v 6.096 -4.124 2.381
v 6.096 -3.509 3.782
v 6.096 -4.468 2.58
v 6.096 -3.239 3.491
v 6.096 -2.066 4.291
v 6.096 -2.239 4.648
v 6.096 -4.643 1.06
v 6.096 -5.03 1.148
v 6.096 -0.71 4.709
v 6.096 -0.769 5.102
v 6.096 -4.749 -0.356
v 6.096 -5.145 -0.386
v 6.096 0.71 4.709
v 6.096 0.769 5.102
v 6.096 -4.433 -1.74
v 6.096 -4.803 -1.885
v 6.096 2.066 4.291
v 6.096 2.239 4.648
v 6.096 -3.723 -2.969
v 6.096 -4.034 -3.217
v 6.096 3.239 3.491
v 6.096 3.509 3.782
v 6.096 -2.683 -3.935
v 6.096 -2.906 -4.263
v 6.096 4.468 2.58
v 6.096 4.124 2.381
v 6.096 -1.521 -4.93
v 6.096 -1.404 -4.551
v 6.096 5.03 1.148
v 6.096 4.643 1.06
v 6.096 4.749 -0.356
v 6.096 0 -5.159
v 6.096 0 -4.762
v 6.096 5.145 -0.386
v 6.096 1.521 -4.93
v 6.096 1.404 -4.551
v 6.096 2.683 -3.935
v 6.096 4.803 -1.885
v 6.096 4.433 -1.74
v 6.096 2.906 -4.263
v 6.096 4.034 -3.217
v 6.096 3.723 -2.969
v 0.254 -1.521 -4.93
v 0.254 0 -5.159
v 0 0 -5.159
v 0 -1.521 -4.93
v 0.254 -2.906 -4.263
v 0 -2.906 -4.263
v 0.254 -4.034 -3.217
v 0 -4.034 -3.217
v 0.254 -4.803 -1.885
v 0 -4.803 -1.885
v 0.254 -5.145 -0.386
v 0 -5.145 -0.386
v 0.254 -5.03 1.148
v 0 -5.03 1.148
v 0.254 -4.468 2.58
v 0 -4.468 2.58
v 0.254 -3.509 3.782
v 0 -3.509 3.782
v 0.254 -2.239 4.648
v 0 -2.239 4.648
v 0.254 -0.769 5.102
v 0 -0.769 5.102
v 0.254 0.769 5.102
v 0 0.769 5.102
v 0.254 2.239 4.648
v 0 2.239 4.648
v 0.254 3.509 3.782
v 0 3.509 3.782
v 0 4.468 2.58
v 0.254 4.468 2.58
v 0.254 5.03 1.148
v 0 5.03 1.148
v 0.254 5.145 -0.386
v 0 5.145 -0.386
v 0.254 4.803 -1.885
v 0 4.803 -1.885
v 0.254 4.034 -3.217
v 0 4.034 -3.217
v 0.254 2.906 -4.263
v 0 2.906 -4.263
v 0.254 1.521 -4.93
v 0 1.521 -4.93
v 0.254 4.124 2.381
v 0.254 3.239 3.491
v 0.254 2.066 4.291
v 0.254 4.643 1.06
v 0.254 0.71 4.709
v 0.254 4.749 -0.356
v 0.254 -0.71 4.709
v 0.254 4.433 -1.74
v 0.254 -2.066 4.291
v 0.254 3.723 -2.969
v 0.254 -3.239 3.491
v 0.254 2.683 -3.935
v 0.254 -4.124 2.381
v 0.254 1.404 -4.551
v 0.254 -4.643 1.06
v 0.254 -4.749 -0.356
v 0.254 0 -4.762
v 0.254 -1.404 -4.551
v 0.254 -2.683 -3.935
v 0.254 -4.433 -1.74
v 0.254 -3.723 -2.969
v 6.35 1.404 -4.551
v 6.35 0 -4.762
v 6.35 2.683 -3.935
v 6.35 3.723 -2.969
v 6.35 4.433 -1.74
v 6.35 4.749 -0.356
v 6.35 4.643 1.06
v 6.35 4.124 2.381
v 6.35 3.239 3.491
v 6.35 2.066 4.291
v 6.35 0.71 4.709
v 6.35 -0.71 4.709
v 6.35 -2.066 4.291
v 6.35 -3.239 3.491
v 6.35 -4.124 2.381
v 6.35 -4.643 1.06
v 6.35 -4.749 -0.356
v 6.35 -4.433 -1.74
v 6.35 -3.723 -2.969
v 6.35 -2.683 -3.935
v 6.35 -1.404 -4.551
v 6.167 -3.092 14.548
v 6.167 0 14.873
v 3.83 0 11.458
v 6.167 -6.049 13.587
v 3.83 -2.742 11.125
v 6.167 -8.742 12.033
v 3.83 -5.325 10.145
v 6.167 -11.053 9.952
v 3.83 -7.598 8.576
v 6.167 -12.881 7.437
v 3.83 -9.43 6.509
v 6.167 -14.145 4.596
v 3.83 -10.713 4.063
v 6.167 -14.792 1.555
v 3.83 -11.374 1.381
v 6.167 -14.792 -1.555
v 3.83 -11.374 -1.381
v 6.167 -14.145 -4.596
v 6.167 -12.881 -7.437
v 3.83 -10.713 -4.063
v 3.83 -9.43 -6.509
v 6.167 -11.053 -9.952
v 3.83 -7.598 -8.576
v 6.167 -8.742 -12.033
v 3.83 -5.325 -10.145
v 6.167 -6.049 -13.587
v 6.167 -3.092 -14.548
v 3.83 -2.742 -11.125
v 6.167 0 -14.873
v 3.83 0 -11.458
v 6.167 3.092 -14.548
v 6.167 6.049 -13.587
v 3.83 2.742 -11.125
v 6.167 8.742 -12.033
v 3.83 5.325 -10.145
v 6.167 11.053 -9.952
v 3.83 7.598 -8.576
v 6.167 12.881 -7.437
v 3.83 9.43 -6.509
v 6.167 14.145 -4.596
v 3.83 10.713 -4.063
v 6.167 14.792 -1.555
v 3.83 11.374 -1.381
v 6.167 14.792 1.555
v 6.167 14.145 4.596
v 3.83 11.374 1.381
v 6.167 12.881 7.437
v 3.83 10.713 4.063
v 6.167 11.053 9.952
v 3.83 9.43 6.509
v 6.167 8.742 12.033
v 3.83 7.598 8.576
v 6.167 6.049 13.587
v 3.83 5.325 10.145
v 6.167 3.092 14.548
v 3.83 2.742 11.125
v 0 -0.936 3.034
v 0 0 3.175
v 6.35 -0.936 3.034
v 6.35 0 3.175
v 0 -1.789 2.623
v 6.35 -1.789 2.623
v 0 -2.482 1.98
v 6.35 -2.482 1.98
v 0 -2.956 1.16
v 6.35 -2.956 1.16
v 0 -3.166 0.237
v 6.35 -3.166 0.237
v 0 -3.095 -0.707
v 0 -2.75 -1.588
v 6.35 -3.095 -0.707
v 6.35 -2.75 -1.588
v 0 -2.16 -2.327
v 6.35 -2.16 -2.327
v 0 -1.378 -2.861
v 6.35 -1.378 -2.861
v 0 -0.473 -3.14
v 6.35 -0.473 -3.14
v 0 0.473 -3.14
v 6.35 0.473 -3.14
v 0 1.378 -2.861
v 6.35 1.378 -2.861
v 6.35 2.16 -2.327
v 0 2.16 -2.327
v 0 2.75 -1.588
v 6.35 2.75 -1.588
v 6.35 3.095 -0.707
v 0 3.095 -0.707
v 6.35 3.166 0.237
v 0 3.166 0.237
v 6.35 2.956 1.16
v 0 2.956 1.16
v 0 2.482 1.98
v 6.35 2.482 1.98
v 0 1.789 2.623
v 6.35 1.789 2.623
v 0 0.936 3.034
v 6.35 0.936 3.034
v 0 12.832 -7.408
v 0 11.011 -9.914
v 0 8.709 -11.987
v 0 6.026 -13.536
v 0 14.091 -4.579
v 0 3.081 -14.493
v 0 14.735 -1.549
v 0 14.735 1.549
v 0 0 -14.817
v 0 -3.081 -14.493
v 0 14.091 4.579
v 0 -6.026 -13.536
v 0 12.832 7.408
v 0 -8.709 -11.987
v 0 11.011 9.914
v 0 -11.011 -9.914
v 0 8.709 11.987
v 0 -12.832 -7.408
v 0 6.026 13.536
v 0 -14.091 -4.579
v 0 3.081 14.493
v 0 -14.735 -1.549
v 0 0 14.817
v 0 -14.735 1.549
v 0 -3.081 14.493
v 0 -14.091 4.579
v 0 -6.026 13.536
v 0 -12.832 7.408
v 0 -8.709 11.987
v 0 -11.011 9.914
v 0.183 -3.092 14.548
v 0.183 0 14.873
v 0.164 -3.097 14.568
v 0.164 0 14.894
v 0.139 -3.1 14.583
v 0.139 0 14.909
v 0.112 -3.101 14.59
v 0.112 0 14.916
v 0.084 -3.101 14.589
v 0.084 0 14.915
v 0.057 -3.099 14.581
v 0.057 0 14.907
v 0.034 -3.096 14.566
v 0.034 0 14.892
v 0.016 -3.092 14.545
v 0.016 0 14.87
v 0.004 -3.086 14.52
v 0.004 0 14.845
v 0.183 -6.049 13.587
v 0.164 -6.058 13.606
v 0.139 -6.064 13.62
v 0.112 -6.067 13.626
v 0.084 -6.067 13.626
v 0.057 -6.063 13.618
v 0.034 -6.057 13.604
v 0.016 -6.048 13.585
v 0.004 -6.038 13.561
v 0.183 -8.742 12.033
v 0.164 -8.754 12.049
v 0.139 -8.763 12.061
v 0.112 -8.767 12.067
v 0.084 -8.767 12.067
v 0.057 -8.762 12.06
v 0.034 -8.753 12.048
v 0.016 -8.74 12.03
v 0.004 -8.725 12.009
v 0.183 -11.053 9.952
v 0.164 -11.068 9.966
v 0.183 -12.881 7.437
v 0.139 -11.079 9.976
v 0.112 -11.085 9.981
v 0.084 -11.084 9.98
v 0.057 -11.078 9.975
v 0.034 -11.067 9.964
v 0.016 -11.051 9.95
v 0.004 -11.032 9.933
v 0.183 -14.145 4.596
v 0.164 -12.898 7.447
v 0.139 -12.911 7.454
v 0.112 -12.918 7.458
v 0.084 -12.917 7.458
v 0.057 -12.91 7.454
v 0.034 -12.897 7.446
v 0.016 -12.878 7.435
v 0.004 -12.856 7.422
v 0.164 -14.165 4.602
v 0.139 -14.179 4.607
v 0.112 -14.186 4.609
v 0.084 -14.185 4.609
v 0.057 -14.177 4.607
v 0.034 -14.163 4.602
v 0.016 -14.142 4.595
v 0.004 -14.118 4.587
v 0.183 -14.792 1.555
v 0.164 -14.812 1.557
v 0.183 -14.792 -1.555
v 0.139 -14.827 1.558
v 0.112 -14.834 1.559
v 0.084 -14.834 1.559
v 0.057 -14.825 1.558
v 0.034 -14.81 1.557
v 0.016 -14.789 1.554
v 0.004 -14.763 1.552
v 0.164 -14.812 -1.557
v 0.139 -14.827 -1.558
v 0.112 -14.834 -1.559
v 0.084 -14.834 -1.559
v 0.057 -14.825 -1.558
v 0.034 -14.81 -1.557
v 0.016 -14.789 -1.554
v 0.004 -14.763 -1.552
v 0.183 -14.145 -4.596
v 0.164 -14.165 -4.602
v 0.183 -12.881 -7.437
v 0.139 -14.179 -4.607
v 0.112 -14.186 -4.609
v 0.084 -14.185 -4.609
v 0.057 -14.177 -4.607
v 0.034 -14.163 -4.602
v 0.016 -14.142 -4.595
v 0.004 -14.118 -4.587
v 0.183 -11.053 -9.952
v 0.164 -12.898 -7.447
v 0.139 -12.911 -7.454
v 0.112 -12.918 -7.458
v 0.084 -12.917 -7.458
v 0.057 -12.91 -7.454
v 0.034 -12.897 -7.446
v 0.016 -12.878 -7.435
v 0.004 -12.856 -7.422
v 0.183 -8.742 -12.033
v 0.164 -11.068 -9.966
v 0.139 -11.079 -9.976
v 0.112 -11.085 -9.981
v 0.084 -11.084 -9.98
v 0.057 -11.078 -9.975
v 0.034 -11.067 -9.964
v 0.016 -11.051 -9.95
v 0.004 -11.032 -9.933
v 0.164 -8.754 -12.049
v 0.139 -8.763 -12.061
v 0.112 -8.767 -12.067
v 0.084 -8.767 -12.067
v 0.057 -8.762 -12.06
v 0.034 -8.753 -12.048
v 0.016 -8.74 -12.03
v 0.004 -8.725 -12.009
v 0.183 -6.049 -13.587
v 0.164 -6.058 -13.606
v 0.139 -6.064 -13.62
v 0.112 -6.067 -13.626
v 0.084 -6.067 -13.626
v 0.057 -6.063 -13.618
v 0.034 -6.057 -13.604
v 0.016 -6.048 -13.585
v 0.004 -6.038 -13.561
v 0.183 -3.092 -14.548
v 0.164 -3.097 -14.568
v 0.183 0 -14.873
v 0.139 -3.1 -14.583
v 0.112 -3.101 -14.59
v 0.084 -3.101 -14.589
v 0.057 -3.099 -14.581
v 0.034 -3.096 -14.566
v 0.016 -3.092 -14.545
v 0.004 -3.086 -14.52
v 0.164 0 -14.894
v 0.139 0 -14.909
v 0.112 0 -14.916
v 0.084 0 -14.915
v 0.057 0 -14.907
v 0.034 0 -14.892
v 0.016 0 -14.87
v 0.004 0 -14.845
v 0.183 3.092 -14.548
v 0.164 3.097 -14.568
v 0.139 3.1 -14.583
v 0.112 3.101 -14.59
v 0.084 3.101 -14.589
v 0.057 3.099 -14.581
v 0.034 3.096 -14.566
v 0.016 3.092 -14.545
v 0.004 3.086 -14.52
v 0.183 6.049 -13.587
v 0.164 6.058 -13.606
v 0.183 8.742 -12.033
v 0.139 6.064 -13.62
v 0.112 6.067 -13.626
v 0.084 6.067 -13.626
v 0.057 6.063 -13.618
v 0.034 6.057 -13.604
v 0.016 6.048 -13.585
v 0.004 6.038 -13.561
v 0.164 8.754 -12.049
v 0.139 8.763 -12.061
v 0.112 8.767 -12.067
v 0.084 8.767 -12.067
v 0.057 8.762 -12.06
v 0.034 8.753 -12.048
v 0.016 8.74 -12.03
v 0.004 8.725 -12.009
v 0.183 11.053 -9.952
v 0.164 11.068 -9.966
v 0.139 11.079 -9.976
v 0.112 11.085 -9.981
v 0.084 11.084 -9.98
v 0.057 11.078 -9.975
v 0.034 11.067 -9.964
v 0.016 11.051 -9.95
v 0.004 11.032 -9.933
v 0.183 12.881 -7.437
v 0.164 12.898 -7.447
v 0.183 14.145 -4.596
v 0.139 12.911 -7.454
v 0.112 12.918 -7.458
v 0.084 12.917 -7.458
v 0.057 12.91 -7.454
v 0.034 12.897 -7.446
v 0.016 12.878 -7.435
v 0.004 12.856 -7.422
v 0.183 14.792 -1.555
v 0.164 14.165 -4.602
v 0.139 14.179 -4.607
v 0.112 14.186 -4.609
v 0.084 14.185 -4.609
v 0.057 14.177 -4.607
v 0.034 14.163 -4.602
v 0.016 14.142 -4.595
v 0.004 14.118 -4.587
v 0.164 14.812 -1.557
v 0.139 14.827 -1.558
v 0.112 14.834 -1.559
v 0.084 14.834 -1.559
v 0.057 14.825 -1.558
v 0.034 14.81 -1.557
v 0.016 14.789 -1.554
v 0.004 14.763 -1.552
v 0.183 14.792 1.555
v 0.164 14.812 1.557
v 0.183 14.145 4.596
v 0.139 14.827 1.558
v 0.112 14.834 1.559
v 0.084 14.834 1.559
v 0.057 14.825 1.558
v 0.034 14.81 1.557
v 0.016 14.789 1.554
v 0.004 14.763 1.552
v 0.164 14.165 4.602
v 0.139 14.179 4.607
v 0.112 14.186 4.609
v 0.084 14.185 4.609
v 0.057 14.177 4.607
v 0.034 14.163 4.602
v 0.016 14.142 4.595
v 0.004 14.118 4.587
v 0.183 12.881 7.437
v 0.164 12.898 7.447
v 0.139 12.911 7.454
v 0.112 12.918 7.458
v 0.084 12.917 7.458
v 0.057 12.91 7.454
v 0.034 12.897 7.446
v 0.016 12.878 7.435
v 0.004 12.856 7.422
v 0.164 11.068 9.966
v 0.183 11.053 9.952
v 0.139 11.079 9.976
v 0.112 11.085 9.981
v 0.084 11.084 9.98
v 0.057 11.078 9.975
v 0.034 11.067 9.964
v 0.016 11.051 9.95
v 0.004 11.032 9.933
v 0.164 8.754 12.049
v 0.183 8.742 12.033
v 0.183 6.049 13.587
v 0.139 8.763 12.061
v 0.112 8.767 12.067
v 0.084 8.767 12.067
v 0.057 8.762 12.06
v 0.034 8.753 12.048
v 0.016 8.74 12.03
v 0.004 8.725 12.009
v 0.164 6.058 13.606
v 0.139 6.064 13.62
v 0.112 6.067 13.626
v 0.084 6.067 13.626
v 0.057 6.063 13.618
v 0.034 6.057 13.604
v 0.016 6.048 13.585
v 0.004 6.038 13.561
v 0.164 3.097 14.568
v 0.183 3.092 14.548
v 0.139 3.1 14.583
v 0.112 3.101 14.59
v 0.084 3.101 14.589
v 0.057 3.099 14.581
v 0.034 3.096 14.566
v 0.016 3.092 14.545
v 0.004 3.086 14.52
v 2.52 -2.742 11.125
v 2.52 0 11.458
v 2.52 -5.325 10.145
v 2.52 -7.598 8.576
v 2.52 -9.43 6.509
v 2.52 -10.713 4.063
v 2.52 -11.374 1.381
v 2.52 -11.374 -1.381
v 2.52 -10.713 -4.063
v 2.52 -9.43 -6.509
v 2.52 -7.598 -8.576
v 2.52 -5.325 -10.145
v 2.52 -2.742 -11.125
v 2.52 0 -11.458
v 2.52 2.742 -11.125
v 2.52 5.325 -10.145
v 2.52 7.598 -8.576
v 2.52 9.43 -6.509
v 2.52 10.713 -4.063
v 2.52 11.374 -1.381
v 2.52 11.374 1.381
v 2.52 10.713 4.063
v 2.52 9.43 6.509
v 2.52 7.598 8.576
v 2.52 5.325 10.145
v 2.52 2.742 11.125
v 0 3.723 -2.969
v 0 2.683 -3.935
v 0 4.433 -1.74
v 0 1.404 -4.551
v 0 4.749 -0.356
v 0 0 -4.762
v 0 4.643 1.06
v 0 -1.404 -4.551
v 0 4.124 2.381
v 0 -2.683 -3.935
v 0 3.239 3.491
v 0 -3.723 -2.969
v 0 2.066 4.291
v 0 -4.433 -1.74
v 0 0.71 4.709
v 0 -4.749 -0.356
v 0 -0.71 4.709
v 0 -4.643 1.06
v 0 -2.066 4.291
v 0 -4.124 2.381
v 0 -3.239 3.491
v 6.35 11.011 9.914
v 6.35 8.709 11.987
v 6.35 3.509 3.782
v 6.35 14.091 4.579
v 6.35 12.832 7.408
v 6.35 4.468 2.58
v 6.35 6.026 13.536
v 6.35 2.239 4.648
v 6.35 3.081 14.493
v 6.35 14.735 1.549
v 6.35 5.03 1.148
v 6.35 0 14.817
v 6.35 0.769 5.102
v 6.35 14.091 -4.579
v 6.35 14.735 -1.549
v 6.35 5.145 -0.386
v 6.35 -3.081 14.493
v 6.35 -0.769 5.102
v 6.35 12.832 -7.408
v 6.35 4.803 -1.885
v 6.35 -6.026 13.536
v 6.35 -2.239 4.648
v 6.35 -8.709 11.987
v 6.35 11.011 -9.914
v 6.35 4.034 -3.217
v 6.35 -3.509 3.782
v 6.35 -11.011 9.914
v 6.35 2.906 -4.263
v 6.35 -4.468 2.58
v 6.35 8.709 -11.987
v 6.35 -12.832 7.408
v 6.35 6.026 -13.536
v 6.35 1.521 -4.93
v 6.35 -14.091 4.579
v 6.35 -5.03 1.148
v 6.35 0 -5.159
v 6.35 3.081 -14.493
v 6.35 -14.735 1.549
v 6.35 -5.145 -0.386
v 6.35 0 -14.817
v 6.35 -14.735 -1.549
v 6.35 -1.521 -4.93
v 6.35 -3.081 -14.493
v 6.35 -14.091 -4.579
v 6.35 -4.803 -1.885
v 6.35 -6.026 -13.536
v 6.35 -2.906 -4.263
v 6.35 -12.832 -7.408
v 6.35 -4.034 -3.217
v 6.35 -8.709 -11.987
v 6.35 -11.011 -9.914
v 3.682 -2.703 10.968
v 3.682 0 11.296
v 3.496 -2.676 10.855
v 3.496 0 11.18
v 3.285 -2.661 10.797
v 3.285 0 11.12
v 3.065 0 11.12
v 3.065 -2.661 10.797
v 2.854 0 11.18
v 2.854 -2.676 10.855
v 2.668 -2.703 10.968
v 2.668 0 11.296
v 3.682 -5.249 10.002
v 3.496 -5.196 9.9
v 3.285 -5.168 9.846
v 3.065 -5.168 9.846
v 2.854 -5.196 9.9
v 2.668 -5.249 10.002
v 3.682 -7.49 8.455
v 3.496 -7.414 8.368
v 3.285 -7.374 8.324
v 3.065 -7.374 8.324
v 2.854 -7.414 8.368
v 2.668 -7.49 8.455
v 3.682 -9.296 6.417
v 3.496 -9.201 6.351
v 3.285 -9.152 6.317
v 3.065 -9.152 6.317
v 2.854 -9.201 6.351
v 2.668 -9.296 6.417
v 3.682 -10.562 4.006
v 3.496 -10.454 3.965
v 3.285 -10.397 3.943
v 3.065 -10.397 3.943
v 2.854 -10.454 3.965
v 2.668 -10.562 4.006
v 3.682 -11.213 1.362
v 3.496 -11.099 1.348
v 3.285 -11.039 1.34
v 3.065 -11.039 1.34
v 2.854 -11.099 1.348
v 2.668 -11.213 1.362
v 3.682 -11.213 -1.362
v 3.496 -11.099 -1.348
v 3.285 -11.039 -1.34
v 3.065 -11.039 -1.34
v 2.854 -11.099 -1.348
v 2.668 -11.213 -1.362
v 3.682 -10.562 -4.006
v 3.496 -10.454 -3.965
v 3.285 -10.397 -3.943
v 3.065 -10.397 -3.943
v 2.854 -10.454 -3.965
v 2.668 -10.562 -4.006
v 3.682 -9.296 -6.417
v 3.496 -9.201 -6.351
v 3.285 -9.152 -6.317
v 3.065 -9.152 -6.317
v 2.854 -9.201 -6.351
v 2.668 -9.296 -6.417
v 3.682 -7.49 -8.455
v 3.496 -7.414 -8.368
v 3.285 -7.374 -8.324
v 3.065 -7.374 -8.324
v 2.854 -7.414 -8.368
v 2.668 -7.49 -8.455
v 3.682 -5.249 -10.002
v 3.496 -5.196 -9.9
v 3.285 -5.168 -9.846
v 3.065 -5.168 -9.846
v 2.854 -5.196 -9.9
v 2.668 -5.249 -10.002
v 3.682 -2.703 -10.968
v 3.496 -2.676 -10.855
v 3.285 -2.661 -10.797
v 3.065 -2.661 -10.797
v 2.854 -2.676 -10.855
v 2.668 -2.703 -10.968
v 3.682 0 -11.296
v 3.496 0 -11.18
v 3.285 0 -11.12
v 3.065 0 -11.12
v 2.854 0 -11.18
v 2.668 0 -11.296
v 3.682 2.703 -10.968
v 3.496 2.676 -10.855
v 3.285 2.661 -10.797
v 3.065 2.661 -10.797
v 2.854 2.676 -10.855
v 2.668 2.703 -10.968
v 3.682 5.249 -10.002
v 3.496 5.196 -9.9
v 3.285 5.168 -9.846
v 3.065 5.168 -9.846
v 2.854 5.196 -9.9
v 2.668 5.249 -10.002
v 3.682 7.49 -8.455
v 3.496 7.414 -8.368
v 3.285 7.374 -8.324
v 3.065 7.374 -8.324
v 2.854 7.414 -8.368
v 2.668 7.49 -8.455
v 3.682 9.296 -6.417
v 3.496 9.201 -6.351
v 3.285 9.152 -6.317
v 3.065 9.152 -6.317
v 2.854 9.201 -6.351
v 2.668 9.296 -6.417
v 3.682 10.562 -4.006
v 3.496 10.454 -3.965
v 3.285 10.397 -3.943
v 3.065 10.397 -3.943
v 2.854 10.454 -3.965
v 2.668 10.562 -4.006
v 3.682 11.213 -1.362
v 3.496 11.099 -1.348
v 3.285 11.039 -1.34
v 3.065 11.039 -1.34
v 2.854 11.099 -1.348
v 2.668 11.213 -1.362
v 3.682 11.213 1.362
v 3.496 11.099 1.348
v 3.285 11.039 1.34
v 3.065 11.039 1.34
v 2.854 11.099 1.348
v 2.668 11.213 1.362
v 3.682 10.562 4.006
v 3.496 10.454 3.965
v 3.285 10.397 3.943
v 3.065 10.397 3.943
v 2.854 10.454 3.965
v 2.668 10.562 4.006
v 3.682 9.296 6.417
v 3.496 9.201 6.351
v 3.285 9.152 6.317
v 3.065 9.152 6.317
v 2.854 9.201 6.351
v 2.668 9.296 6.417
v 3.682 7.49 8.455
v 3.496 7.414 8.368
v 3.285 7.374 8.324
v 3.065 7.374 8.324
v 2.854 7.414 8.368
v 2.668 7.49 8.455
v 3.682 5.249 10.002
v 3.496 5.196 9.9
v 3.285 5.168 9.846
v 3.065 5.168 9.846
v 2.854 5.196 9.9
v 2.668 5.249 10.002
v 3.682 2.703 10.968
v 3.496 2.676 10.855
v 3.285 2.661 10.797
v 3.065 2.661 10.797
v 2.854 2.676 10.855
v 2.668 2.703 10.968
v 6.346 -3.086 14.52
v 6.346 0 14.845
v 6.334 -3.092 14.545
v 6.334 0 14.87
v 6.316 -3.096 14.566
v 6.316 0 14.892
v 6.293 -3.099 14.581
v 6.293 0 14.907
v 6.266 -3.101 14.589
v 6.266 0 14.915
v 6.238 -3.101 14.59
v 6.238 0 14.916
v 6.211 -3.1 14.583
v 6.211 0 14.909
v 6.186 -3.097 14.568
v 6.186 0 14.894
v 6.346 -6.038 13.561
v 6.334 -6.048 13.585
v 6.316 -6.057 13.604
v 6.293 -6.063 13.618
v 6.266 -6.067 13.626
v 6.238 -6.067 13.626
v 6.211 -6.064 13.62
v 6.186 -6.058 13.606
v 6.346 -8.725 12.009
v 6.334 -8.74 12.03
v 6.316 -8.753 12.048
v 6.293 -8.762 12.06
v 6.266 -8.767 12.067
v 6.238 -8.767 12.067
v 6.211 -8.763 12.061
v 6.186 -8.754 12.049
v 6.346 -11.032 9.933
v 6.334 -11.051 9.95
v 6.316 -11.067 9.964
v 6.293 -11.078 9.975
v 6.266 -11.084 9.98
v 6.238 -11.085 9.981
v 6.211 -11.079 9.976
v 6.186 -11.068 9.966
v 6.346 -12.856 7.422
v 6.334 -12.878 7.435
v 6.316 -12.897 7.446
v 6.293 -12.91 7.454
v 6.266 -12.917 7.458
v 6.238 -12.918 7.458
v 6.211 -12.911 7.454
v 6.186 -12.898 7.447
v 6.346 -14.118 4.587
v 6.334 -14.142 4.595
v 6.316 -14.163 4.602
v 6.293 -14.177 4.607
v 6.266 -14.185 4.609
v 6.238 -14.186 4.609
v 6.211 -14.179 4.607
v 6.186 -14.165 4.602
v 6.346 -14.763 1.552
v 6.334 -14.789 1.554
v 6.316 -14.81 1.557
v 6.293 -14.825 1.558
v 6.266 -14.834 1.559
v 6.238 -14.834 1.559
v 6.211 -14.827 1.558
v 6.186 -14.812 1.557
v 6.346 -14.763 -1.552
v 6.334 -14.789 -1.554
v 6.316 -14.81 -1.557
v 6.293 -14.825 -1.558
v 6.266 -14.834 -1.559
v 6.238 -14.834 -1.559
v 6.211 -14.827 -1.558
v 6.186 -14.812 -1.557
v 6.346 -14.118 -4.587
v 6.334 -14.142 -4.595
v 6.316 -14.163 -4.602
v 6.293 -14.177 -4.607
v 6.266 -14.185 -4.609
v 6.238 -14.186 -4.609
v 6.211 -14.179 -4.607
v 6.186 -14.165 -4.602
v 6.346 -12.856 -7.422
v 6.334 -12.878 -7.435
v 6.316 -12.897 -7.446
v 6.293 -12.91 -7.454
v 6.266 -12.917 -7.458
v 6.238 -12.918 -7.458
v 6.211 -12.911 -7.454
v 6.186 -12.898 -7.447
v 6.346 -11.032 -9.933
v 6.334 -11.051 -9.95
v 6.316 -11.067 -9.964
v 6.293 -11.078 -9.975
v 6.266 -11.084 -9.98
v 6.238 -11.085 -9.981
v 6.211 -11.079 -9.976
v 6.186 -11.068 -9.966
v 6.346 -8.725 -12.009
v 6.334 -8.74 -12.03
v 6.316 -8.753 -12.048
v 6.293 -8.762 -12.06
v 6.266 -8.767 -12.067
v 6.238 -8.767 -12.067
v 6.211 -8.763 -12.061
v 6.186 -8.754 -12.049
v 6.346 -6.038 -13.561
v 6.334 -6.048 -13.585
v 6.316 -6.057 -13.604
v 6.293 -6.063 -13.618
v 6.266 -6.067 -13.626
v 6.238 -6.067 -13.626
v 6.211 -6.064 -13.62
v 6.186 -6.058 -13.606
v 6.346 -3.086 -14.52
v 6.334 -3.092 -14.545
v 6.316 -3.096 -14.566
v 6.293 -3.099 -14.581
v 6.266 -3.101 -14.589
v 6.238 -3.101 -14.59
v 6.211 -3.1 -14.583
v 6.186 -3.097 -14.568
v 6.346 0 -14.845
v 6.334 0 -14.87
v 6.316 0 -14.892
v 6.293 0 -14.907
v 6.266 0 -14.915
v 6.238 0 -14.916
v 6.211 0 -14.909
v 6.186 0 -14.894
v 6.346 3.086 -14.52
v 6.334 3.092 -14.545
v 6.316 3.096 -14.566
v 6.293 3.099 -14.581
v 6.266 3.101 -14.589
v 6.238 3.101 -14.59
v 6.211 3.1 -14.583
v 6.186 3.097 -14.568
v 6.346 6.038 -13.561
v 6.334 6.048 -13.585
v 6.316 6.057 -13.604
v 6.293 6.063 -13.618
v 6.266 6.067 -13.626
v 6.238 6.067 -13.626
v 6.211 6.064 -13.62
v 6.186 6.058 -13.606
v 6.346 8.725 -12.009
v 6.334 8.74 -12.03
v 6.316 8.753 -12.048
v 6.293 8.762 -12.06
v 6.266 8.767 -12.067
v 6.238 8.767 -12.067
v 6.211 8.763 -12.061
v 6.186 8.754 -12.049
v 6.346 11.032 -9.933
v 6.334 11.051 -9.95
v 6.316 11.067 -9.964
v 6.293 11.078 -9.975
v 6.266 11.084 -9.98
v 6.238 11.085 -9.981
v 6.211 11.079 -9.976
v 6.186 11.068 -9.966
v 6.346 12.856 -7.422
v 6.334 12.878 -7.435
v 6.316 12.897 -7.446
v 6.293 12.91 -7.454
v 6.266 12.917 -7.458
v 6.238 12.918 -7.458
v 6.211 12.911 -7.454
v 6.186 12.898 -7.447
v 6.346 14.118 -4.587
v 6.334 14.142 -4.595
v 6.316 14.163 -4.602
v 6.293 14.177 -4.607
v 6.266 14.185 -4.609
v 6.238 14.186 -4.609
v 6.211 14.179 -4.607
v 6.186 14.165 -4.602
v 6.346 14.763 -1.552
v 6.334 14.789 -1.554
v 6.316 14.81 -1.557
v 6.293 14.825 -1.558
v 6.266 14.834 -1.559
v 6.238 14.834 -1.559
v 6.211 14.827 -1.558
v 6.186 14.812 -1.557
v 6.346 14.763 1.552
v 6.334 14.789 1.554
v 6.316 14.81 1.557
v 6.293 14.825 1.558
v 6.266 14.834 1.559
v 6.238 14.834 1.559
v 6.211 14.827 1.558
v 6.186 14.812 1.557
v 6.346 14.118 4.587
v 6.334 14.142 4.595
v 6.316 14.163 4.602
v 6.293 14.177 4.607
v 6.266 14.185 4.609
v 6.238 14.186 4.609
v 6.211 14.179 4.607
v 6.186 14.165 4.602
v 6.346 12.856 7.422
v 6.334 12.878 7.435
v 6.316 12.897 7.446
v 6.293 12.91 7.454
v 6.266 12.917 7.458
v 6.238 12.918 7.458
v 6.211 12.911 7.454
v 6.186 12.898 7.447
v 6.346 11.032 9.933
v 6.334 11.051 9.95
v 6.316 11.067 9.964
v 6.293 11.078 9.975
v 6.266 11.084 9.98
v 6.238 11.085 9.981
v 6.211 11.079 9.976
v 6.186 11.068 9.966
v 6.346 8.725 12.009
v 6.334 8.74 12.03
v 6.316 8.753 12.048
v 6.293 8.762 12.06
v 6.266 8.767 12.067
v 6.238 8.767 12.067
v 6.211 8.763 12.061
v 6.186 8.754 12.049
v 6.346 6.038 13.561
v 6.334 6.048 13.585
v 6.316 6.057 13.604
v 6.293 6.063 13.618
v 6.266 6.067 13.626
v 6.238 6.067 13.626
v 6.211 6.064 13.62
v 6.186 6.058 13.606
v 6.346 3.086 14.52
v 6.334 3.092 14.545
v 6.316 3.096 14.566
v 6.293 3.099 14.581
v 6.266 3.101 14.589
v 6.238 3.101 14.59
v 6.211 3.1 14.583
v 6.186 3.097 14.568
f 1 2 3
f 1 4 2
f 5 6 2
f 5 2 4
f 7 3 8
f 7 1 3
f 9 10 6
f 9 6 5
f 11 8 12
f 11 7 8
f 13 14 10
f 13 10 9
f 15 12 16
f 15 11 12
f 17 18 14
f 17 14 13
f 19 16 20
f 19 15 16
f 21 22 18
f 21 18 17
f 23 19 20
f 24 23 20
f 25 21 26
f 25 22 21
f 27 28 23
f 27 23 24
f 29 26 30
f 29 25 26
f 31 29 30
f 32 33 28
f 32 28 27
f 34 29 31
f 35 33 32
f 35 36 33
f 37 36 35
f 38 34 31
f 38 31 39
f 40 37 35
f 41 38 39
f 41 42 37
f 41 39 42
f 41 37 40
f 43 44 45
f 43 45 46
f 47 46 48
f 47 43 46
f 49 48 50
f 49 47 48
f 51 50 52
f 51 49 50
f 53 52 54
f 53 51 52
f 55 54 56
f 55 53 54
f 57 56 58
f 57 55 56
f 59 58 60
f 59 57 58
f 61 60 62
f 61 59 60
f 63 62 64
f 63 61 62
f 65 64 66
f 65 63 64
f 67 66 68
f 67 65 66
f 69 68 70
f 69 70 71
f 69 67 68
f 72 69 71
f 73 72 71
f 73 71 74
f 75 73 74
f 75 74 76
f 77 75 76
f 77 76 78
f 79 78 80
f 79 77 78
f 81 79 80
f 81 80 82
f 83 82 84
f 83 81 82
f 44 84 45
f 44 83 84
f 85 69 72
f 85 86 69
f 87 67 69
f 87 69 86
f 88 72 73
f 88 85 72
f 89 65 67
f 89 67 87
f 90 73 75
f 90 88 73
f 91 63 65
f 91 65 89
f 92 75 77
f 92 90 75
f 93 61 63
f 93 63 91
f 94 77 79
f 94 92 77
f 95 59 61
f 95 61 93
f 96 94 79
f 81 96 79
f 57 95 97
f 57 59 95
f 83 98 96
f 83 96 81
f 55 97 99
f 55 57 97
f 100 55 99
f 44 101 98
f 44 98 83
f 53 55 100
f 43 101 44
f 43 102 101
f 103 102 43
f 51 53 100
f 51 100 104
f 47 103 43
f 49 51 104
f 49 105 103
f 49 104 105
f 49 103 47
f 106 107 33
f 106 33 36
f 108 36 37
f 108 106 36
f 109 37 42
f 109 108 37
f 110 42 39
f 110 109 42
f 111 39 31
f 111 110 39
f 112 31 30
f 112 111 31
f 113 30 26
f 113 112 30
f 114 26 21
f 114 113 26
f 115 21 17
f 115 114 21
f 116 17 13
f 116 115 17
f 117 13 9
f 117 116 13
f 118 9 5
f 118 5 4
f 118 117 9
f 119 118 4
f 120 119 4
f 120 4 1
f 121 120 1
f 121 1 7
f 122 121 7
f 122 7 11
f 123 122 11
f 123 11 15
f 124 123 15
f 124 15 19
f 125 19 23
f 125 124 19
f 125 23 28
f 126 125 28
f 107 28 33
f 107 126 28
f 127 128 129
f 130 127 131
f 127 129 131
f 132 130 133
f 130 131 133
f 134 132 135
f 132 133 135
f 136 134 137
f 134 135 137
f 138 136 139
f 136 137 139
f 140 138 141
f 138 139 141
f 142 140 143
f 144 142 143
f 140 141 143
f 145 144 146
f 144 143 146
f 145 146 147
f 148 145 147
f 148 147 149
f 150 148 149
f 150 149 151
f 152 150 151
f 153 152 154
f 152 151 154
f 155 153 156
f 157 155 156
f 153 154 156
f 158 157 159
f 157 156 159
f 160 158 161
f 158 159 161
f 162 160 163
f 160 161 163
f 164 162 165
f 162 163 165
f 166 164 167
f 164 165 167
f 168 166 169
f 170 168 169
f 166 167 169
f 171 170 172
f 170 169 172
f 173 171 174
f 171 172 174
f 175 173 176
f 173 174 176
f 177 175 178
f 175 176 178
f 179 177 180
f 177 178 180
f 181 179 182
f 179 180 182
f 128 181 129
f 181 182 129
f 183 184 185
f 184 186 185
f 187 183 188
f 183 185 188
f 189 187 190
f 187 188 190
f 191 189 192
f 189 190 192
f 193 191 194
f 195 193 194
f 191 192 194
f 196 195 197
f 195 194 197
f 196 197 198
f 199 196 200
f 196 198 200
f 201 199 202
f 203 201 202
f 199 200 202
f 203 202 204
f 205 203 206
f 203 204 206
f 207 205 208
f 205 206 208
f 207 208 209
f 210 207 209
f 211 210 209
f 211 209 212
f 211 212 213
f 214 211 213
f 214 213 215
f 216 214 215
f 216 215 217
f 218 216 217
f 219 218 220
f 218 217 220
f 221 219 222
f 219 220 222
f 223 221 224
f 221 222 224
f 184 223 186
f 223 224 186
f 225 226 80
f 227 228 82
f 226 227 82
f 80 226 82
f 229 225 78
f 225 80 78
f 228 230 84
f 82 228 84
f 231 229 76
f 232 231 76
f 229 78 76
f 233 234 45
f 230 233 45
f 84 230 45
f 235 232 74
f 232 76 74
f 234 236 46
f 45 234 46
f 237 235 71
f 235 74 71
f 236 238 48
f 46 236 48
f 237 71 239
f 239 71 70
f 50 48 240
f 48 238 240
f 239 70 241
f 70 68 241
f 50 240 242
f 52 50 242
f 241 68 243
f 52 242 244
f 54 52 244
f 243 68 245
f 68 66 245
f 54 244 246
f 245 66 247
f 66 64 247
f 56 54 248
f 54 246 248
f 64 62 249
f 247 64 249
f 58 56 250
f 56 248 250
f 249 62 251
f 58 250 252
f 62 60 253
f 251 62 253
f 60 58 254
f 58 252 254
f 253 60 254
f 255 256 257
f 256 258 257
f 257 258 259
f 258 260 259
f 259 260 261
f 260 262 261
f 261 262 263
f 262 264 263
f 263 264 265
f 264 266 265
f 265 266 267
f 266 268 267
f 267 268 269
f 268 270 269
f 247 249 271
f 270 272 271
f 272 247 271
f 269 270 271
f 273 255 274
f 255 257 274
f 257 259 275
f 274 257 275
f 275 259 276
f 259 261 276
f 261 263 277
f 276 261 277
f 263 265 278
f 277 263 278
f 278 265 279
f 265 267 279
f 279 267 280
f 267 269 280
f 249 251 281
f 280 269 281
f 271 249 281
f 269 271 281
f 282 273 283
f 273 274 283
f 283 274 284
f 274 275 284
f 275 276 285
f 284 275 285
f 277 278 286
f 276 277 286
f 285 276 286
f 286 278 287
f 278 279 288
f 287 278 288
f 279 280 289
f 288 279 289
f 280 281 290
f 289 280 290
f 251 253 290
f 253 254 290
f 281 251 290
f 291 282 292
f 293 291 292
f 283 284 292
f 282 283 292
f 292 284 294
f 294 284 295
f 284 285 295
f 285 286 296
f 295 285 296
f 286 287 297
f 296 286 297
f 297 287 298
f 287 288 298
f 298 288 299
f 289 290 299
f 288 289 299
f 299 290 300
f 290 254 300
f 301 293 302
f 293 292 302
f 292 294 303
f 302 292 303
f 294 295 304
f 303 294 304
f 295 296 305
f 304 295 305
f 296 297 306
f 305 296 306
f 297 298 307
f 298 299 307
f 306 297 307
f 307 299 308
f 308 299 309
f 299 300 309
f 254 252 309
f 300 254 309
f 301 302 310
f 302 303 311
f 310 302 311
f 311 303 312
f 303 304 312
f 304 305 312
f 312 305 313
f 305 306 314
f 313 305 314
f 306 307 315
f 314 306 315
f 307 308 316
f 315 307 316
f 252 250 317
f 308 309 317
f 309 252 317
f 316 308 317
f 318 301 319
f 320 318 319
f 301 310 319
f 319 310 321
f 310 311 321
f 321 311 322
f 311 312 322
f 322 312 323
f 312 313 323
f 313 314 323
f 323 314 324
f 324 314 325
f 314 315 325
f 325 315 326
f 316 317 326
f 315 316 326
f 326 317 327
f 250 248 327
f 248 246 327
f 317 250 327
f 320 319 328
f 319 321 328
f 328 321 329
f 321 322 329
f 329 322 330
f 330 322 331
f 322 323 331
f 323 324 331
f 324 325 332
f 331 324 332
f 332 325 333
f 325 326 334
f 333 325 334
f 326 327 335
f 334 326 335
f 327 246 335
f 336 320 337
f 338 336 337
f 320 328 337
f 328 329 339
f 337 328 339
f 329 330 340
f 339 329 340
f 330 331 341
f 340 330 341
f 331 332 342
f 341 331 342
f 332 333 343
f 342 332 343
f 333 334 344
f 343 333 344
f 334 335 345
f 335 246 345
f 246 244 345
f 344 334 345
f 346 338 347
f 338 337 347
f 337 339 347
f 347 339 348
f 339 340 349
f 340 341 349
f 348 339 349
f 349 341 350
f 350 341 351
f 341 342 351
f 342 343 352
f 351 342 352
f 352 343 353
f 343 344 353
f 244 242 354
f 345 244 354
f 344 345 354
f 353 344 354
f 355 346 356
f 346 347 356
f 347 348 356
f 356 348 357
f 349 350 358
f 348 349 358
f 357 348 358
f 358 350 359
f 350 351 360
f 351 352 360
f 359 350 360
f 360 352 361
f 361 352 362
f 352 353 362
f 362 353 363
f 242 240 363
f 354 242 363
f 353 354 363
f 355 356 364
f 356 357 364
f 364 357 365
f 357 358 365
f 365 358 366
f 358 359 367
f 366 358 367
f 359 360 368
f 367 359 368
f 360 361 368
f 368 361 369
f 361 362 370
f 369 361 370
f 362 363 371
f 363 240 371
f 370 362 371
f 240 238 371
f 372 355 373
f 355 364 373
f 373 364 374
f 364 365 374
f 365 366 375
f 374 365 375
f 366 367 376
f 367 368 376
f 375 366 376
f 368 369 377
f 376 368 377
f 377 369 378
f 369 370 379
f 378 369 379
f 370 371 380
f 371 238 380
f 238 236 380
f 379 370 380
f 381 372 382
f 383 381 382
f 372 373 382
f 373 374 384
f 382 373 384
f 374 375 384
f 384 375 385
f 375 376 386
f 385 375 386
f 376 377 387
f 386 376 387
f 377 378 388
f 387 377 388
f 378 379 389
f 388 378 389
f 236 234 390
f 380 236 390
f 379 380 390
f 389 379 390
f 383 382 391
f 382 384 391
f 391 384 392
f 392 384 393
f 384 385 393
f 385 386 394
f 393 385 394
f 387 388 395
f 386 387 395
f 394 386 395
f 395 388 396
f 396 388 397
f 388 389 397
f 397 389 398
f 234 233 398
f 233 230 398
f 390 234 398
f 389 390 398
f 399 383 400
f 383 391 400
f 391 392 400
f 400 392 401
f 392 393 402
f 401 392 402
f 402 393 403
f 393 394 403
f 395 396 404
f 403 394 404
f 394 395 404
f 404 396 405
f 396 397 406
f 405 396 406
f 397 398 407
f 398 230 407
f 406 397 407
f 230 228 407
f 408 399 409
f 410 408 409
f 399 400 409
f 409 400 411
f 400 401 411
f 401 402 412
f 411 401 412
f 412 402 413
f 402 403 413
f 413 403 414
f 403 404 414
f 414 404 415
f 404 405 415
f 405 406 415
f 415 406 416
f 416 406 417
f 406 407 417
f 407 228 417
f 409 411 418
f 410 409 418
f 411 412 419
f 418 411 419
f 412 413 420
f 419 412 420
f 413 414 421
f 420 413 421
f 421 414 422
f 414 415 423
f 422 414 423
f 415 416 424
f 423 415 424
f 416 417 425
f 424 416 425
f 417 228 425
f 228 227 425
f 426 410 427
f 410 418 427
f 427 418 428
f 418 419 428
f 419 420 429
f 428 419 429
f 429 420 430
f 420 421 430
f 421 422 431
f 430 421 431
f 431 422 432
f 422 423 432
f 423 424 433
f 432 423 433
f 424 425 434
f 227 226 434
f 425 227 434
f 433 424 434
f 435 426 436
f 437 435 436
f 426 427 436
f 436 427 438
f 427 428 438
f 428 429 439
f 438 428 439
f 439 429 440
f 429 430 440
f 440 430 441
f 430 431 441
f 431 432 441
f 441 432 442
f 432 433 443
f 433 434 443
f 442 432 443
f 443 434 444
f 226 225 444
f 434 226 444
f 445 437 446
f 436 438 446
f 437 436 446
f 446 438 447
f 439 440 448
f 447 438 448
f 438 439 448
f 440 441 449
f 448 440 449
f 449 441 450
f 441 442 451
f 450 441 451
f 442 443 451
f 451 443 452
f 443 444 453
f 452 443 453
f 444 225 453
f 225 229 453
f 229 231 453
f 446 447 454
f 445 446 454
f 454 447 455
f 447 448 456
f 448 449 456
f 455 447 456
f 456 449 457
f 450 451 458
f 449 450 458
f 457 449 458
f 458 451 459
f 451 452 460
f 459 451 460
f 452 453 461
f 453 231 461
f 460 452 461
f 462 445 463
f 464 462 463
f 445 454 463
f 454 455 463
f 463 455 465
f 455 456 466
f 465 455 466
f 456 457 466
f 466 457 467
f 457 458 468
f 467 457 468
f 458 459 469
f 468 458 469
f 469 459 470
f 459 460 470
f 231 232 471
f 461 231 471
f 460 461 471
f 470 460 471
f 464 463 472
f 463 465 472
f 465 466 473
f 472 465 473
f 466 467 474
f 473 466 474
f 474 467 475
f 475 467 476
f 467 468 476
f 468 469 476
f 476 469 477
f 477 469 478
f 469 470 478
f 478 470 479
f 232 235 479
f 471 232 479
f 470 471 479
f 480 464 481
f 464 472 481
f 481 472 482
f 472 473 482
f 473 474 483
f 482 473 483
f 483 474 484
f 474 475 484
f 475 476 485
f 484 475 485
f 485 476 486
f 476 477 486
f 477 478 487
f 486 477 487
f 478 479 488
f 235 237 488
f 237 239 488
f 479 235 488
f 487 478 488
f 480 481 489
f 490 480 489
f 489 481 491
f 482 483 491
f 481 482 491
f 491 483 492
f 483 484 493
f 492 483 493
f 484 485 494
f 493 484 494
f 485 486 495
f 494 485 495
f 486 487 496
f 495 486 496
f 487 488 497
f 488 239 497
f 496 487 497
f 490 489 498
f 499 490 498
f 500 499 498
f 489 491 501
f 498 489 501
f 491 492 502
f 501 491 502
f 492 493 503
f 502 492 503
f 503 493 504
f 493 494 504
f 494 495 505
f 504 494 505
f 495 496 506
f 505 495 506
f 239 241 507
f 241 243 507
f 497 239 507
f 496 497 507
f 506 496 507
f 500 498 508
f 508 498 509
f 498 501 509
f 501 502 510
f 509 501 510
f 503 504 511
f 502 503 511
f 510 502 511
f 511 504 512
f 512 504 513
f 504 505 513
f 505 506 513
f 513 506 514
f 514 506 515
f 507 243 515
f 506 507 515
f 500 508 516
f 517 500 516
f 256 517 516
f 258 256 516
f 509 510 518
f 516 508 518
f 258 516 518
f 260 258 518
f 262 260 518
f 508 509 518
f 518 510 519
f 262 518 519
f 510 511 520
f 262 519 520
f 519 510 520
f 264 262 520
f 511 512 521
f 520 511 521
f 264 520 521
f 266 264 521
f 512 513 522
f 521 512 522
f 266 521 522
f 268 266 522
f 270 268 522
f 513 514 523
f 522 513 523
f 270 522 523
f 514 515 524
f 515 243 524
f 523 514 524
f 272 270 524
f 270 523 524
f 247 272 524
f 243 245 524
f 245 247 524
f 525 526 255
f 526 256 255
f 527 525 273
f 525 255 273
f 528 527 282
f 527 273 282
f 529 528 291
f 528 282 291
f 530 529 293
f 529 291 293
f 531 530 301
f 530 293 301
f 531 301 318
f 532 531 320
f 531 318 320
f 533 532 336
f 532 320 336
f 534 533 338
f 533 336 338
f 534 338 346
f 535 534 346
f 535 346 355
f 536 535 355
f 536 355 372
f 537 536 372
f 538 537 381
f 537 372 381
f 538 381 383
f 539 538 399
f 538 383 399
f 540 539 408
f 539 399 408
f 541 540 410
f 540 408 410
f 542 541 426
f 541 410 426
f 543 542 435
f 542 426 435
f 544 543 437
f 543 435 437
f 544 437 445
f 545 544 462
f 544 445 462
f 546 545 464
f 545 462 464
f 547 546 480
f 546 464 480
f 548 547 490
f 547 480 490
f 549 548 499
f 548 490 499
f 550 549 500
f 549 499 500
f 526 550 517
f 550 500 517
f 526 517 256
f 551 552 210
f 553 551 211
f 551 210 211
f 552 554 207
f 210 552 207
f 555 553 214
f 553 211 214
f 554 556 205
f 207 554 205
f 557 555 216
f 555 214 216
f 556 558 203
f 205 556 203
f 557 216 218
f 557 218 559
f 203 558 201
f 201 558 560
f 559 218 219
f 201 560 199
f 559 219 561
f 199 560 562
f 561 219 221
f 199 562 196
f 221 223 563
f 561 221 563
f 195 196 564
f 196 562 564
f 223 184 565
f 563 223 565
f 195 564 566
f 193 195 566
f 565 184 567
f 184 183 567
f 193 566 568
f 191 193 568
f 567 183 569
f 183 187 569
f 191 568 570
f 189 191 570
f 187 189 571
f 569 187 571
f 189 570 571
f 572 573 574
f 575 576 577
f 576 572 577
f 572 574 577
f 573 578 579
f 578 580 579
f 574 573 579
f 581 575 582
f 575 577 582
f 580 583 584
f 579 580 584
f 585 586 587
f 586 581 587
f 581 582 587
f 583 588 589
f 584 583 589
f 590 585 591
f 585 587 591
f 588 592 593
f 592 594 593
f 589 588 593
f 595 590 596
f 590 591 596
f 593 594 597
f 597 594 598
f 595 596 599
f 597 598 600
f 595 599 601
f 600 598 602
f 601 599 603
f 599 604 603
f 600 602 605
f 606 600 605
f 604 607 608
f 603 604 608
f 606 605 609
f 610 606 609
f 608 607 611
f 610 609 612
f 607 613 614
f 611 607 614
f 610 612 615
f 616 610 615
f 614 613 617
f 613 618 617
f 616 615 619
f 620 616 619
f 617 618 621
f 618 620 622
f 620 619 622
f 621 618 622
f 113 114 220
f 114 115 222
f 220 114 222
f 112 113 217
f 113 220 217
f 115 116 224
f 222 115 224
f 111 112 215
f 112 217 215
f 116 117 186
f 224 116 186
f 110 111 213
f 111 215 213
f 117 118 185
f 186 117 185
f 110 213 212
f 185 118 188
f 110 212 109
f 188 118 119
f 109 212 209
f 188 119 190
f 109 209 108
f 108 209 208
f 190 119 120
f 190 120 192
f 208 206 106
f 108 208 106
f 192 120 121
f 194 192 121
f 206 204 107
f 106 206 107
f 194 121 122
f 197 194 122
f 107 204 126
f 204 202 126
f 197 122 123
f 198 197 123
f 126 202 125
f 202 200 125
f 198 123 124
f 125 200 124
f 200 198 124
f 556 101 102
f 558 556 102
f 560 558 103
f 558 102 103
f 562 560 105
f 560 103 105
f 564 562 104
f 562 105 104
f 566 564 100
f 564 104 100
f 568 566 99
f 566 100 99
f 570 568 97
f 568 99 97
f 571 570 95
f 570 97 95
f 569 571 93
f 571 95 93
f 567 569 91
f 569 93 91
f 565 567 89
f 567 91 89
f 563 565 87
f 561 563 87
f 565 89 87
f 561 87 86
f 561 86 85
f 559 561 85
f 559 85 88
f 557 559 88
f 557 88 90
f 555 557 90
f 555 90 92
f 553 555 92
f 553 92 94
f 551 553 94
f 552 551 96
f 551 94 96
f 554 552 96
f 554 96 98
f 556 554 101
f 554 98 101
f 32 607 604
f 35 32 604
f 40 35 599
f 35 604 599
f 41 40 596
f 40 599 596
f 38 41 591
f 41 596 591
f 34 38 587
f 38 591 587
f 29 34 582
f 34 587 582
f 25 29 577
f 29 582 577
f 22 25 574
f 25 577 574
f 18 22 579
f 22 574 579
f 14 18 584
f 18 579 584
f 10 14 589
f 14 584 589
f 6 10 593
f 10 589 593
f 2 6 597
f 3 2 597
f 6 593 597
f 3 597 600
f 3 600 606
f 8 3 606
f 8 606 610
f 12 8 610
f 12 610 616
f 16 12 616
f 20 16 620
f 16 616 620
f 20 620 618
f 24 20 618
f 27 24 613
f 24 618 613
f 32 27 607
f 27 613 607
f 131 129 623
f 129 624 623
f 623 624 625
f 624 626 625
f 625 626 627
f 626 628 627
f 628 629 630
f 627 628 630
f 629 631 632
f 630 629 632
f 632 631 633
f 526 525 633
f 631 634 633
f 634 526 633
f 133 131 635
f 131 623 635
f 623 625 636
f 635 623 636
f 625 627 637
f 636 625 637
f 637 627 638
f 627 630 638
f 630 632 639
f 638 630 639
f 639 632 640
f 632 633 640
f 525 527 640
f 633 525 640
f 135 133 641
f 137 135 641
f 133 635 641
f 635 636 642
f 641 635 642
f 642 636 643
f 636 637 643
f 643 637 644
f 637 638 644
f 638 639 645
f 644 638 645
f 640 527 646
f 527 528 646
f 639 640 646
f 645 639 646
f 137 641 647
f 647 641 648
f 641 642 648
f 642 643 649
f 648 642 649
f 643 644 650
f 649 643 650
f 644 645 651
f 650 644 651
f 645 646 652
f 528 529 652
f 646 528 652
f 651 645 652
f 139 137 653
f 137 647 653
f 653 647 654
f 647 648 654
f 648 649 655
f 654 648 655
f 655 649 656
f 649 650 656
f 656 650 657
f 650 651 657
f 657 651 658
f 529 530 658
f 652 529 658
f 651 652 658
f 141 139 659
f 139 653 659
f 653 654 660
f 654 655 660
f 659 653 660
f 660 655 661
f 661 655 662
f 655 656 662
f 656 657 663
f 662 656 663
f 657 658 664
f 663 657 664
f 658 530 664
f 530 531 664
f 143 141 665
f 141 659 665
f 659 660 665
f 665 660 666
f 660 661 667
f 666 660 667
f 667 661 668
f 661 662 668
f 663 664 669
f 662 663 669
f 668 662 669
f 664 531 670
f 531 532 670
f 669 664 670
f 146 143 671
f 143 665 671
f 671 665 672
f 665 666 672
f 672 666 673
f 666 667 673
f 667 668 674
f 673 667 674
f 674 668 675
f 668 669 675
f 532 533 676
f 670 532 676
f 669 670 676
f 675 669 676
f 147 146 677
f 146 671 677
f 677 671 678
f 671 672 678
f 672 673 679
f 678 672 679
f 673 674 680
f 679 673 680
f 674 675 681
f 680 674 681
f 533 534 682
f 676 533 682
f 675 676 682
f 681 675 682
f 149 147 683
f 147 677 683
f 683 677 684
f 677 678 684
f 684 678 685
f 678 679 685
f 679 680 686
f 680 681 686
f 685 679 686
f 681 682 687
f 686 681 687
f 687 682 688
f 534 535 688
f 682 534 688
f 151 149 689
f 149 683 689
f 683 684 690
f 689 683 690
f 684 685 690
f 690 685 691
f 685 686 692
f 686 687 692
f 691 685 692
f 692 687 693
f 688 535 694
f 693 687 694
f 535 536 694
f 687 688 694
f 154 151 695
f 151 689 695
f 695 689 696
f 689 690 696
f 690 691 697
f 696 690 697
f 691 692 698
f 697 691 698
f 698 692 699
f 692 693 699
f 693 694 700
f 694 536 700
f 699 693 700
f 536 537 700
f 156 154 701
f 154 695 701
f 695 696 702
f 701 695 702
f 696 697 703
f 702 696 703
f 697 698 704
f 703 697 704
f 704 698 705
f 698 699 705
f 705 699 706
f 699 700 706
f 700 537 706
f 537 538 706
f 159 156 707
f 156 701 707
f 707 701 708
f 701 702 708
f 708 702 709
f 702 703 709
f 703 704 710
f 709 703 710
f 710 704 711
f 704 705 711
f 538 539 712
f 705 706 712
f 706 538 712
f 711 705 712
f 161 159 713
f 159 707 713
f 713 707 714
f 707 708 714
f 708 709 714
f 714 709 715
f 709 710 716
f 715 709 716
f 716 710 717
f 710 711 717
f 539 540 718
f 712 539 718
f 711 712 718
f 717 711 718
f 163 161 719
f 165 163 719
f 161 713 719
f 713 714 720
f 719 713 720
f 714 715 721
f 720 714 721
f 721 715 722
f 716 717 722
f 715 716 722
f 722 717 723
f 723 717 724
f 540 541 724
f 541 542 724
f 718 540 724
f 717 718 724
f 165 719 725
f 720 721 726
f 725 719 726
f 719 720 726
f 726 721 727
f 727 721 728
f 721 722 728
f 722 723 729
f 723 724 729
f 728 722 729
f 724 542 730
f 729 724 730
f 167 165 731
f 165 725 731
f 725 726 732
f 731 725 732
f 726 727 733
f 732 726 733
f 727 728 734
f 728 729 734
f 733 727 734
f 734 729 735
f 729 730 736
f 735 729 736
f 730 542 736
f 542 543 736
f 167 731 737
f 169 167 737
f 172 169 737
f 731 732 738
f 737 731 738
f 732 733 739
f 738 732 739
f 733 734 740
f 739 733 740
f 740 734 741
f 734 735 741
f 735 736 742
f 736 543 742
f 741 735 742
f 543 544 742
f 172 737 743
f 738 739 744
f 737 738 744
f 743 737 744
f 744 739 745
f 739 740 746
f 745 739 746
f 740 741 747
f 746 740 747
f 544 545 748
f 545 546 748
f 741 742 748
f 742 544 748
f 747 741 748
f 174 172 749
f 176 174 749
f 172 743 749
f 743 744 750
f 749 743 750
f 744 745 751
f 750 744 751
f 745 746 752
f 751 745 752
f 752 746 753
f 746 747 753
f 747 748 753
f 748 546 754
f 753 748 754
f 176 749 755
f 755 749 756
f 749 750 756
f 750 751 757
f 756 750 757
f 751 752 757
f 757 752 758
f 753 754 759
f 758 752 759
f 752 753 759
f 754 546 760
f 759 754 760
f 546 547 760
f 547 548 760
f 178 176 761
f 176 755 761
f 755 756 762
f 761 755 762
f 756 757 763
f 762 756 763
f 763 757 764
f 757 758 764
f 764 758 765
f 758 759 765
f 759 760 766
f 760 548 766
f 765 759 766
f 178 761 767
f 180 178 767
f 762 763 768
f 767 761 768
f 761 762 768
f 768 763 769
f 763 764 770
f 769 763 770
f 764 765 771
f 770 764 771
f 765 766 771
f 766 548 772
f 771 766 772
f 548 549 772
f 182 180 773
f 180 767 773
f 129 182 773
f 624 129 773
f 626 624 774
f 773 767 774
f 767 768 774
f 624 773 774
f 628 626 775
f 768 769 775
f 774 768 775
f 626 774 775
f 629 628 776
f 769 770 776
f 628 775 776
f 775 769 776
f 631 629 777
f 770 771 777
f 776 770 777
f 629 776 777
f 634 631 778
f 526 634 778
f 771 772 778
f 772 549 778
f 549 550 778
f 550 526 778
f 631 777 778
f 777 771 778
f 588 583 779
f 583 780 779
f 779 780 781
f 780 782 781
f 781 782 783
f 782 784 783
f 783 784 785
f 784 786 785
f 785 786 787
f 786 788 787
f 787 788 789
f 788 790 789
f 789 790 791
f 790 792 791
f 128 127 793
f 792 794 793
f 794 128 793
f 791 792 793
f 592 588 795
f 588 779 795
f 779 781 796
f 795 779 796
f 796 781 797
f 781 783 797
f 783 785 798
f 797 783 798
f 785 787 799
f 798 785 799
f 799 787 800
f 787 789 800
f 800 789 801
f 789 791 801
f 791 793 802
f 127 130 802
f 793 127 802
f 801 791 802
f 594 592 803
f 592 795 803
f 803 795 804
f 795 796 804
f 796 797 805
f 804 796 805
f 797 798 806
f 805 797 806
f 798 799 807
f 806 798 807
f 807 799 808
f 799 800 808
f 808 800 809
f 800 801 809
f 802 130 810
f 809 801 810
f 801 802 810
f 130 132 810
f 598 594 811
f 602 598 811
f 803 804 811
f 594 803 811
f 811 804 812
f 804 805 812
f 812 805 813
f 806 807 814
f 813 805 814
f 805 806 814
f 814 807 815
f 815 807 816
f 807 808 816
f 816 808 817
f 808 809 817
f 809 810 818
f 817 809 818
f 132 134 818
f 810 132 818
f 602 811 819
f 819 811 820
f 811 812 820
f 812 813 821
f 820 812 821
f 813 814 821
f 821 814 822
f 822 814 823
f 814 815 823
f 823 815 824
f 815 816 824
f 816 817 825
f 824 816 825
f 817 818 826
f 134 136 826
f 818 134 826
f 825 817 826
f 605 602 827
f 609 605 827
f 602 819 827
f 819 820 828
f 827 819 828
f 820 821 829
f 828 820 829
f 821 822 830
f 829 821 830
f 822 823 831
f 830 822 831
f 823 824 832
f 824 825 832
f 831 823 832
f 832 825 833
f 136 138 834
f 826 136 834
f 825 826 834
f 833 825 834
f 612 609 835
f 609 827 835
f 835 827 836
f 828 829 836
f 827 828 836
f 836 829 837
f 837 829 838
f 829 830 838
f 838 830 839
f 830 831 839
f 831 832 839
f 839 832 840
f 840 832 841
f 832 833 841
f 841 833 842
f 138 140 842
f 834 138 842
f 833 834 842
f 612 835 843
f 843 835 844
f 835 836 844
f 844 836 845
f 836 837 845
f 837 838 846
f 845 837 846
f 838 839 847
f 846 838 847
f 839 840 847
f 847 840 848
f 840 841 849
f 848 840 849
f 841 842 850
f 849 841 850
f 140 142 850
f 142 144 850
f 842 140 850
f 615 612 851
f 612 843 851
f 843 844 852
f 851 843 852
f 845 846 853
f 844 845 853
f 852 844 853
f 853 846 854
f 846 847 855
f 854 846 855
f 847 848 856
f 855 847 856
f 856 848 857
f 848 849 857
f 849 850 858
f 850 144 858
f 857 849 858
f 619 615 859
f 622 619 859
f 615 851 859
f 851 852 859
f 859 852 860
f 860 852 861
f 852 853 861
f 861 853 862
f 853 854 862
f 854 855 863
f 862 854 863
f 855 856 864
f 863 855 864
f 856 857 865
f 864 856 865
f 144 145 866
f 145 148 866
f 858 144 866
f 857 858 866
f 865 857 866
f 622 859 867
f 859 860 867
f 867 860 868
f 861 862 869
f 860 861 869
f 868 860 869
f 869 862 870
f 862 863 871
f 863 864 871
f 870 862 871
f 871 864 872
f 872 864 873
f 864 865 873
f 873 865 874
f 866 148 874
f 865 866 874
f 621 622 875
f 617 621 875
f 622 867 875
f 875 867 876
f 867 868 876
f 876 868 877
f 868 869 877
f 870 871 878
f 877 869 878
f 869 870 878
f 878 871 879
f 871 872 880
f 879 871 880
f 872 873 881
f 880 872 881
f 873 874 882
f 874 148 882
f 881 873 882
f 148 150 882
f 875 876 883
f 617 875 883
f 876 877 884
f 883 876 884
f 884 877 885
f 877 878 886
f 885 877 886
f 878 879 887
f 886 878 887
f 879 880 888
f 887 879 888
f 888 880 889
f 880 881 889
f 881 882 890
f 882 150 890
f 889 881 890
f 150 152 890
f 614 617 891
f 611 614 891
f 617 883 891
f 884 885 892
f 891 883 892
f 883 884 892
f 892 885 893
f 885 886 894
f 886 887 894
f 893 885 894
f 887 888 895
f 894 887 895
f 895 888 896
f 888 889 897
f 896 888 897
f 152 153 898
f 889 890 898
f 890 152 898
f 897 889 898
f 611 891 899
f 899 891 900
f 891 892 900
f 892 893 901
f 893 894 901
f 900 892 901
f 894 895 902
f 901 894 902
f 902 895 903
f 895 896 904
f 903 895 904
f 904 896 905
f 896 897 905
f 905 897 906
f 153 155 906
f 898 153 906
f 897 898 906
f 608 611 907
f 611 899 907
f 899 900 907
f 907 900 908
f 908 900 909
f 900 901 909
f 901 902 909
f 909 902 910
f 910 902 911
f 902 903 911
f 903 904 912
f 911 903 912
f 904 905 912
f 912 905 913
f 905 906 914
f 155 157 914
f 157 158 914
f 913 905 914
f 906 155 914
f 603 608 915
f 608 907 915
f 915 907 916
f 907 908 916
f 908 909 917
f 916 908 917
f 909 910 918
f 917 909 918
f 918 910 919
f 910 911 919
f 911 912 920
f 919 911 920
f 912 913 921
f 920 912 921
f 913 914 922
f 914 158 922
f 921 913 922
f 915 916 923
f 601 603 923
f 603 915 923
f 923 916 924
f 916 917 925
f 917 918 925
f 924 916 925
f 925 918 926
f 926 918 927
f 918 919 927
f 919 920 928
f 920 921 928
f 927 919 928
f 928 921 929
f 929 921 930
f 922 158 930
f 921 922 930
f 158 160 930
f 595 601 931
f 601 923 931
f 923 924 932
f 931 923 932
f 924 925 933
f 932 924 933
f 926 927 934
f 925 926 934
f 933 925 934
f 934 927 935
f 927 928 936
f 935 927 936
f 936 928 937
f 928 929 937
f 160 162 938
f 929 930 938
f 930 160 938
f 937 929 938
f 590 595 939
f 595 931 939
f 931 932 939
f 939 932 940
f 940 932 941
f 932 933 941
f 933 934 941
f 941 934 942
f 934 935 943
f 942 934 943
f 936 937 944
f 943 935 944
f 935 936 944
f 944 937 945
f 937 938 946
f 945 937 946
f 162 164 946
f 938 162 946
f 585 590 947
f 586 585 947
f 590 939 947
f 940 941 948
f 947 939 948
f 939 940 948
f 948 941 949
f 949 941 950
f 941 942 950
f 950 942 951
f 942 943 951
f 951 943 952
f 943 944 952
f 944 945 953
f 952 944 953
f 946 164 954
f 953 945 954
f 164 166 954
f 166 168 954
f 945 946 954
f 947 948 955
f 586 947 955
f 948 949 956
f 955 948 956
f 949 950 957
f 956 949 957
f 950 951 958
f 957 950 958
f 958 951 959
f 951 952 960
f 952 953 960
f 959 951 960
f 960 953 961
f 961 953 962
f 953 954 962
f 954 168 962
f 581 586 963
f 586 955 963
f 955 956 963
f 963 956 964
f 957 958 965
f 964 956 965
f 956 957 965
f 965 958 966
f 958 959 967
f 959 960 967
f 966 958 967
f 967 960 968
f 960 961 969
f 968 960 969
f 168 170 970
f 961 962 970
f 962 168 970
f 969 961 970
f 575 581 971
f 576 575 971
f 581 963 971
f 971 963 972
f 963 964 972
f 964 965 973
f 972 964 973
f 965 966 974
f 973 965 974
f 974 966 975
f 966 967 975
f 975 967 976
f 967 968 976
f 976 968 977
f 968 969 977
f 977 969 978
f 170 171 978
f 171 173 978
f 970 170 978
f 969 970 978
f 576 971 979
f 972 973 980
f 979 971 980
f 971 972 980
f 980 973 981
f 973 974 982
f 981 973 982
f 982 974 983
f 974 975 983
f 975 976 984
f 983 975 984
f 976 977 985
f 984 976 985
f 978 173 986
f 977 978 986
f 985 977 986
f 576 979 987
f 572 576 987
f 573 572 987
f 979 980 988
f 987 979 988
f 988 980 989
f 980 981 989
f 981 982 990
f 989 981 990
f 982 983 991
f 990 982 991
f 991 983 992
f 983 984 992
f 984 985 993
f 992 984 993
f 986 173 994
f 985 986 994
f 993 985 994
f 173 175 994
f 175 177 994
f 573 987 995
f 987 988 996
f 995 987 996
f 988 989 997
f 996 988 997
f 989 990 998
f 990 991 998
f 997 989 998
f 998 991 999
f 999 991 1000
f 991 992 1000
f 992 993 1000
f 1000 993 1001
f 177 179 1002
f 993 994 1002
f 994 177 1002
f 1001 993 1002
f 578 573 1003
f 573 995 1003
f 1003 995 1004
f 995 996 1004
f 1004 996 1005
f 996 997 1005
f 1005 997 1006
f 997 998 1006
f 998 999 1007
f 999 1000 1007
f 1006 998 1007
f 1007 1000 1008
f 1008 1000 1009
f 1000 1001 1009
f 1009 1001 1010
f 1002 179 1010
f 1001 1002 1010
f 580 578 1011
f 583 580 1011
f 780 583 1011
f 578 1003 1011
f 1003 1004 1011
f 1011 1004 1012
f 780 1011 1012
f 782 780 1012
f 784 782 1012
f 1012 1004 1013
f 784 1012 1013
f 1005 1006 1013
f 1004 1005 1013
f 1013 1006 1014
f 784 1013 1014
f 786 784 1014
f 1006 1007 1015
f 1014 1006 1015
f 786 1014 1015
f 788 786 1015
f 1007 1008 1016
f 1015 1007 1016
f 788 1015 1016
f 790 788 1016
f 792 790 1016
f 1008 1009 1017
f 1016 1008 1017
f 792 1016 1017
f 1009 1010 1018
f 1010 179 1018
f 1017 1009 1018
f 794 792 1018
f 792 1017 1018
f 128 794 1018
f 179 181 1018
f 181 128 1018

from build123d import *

# Parameters (mm, degrees)
SKETCH4_R          = 5.159375
SKETCH4_R_2        = 4.7625
CUT_EXTRUDE1_DEPTH = 0.254
CUT_EXTRUDE2_START = -0.254
SKETCH5_R          = 5.159375
SKETCH5_R_2        = 4.7625
CUT_EXTRUDE2_DEPTH = 0.254


with BuildPart() as part:
    # Sketch1 → Revolve1 (revolve)
    with BuildSketch(Plane.XY, mode=Mode.PRIVATE) as revolve1_sk:
        with BuildLine():
            Line((0, 3.175), (6.35, 3.175))
            Line((6.35, 3.175), (6.35, 14.816666667))
            ThreePointArc((6.35, 14.816666667), (6.279561395, 14.912197415), (6.167477521, 14.87314711))
            Line((6.167477521, 14.87314711), (3.830022177, 11.457936483))
            ThreePointArc((3.830022177, 11.457936483), (3.175, 11.1125), (2.519977823, 11.457936483))
            Line((2.519977823, 11.457936483), (0.182522479, 14.87314711))
            ThreePointArc((0.182522479, 14.87314711), (0.070438605, 14.912197415), (0, 14.816666667))
            Line((0, 14.816666667), (0, 3.175))
        make_face()
    revolve(revolve1_sk.sketch.rotate(Axis((0, 0, 0), (1, 0, 0)), 90), axis=Axis((0, 0, 0), (1, 0, 0)))

    # Sketch4 → Cut-Extrude1 (cut)
    with BuildSketch(Plane(origin=(6.35, 0, 0), x_dir=(0, 0, -1), z_dir=(1, 0, 0))):
        Circle(SKETCH4_R)
        Circle(SKETCH4_R_2, mode=Mode.SUBTRACT)
    extrude(amount=-CUT_EXTRUDE1_DEPTH, mode=Mode.SUBTRACT)

    # Sketch5 → Cut-Extrude2 (cut)
    with BuildSketch(Plane.ZY.offset(CUT_EXTRUDE2_START)):
        with Locations(Location((0, 0, 0), (0, 0, 180))):
            Circle(SKETCH5_R)
        with Locations(Location((0, 0, 0), (0, 0, 180))):
            Circle(SKETCH5_R_2, mode=Mode.SUBTRACT)
    extrude(amount=CUT_EXTRUDE2_DEPTH, mode=Mode.SUBTRACT)


solid = part.part
